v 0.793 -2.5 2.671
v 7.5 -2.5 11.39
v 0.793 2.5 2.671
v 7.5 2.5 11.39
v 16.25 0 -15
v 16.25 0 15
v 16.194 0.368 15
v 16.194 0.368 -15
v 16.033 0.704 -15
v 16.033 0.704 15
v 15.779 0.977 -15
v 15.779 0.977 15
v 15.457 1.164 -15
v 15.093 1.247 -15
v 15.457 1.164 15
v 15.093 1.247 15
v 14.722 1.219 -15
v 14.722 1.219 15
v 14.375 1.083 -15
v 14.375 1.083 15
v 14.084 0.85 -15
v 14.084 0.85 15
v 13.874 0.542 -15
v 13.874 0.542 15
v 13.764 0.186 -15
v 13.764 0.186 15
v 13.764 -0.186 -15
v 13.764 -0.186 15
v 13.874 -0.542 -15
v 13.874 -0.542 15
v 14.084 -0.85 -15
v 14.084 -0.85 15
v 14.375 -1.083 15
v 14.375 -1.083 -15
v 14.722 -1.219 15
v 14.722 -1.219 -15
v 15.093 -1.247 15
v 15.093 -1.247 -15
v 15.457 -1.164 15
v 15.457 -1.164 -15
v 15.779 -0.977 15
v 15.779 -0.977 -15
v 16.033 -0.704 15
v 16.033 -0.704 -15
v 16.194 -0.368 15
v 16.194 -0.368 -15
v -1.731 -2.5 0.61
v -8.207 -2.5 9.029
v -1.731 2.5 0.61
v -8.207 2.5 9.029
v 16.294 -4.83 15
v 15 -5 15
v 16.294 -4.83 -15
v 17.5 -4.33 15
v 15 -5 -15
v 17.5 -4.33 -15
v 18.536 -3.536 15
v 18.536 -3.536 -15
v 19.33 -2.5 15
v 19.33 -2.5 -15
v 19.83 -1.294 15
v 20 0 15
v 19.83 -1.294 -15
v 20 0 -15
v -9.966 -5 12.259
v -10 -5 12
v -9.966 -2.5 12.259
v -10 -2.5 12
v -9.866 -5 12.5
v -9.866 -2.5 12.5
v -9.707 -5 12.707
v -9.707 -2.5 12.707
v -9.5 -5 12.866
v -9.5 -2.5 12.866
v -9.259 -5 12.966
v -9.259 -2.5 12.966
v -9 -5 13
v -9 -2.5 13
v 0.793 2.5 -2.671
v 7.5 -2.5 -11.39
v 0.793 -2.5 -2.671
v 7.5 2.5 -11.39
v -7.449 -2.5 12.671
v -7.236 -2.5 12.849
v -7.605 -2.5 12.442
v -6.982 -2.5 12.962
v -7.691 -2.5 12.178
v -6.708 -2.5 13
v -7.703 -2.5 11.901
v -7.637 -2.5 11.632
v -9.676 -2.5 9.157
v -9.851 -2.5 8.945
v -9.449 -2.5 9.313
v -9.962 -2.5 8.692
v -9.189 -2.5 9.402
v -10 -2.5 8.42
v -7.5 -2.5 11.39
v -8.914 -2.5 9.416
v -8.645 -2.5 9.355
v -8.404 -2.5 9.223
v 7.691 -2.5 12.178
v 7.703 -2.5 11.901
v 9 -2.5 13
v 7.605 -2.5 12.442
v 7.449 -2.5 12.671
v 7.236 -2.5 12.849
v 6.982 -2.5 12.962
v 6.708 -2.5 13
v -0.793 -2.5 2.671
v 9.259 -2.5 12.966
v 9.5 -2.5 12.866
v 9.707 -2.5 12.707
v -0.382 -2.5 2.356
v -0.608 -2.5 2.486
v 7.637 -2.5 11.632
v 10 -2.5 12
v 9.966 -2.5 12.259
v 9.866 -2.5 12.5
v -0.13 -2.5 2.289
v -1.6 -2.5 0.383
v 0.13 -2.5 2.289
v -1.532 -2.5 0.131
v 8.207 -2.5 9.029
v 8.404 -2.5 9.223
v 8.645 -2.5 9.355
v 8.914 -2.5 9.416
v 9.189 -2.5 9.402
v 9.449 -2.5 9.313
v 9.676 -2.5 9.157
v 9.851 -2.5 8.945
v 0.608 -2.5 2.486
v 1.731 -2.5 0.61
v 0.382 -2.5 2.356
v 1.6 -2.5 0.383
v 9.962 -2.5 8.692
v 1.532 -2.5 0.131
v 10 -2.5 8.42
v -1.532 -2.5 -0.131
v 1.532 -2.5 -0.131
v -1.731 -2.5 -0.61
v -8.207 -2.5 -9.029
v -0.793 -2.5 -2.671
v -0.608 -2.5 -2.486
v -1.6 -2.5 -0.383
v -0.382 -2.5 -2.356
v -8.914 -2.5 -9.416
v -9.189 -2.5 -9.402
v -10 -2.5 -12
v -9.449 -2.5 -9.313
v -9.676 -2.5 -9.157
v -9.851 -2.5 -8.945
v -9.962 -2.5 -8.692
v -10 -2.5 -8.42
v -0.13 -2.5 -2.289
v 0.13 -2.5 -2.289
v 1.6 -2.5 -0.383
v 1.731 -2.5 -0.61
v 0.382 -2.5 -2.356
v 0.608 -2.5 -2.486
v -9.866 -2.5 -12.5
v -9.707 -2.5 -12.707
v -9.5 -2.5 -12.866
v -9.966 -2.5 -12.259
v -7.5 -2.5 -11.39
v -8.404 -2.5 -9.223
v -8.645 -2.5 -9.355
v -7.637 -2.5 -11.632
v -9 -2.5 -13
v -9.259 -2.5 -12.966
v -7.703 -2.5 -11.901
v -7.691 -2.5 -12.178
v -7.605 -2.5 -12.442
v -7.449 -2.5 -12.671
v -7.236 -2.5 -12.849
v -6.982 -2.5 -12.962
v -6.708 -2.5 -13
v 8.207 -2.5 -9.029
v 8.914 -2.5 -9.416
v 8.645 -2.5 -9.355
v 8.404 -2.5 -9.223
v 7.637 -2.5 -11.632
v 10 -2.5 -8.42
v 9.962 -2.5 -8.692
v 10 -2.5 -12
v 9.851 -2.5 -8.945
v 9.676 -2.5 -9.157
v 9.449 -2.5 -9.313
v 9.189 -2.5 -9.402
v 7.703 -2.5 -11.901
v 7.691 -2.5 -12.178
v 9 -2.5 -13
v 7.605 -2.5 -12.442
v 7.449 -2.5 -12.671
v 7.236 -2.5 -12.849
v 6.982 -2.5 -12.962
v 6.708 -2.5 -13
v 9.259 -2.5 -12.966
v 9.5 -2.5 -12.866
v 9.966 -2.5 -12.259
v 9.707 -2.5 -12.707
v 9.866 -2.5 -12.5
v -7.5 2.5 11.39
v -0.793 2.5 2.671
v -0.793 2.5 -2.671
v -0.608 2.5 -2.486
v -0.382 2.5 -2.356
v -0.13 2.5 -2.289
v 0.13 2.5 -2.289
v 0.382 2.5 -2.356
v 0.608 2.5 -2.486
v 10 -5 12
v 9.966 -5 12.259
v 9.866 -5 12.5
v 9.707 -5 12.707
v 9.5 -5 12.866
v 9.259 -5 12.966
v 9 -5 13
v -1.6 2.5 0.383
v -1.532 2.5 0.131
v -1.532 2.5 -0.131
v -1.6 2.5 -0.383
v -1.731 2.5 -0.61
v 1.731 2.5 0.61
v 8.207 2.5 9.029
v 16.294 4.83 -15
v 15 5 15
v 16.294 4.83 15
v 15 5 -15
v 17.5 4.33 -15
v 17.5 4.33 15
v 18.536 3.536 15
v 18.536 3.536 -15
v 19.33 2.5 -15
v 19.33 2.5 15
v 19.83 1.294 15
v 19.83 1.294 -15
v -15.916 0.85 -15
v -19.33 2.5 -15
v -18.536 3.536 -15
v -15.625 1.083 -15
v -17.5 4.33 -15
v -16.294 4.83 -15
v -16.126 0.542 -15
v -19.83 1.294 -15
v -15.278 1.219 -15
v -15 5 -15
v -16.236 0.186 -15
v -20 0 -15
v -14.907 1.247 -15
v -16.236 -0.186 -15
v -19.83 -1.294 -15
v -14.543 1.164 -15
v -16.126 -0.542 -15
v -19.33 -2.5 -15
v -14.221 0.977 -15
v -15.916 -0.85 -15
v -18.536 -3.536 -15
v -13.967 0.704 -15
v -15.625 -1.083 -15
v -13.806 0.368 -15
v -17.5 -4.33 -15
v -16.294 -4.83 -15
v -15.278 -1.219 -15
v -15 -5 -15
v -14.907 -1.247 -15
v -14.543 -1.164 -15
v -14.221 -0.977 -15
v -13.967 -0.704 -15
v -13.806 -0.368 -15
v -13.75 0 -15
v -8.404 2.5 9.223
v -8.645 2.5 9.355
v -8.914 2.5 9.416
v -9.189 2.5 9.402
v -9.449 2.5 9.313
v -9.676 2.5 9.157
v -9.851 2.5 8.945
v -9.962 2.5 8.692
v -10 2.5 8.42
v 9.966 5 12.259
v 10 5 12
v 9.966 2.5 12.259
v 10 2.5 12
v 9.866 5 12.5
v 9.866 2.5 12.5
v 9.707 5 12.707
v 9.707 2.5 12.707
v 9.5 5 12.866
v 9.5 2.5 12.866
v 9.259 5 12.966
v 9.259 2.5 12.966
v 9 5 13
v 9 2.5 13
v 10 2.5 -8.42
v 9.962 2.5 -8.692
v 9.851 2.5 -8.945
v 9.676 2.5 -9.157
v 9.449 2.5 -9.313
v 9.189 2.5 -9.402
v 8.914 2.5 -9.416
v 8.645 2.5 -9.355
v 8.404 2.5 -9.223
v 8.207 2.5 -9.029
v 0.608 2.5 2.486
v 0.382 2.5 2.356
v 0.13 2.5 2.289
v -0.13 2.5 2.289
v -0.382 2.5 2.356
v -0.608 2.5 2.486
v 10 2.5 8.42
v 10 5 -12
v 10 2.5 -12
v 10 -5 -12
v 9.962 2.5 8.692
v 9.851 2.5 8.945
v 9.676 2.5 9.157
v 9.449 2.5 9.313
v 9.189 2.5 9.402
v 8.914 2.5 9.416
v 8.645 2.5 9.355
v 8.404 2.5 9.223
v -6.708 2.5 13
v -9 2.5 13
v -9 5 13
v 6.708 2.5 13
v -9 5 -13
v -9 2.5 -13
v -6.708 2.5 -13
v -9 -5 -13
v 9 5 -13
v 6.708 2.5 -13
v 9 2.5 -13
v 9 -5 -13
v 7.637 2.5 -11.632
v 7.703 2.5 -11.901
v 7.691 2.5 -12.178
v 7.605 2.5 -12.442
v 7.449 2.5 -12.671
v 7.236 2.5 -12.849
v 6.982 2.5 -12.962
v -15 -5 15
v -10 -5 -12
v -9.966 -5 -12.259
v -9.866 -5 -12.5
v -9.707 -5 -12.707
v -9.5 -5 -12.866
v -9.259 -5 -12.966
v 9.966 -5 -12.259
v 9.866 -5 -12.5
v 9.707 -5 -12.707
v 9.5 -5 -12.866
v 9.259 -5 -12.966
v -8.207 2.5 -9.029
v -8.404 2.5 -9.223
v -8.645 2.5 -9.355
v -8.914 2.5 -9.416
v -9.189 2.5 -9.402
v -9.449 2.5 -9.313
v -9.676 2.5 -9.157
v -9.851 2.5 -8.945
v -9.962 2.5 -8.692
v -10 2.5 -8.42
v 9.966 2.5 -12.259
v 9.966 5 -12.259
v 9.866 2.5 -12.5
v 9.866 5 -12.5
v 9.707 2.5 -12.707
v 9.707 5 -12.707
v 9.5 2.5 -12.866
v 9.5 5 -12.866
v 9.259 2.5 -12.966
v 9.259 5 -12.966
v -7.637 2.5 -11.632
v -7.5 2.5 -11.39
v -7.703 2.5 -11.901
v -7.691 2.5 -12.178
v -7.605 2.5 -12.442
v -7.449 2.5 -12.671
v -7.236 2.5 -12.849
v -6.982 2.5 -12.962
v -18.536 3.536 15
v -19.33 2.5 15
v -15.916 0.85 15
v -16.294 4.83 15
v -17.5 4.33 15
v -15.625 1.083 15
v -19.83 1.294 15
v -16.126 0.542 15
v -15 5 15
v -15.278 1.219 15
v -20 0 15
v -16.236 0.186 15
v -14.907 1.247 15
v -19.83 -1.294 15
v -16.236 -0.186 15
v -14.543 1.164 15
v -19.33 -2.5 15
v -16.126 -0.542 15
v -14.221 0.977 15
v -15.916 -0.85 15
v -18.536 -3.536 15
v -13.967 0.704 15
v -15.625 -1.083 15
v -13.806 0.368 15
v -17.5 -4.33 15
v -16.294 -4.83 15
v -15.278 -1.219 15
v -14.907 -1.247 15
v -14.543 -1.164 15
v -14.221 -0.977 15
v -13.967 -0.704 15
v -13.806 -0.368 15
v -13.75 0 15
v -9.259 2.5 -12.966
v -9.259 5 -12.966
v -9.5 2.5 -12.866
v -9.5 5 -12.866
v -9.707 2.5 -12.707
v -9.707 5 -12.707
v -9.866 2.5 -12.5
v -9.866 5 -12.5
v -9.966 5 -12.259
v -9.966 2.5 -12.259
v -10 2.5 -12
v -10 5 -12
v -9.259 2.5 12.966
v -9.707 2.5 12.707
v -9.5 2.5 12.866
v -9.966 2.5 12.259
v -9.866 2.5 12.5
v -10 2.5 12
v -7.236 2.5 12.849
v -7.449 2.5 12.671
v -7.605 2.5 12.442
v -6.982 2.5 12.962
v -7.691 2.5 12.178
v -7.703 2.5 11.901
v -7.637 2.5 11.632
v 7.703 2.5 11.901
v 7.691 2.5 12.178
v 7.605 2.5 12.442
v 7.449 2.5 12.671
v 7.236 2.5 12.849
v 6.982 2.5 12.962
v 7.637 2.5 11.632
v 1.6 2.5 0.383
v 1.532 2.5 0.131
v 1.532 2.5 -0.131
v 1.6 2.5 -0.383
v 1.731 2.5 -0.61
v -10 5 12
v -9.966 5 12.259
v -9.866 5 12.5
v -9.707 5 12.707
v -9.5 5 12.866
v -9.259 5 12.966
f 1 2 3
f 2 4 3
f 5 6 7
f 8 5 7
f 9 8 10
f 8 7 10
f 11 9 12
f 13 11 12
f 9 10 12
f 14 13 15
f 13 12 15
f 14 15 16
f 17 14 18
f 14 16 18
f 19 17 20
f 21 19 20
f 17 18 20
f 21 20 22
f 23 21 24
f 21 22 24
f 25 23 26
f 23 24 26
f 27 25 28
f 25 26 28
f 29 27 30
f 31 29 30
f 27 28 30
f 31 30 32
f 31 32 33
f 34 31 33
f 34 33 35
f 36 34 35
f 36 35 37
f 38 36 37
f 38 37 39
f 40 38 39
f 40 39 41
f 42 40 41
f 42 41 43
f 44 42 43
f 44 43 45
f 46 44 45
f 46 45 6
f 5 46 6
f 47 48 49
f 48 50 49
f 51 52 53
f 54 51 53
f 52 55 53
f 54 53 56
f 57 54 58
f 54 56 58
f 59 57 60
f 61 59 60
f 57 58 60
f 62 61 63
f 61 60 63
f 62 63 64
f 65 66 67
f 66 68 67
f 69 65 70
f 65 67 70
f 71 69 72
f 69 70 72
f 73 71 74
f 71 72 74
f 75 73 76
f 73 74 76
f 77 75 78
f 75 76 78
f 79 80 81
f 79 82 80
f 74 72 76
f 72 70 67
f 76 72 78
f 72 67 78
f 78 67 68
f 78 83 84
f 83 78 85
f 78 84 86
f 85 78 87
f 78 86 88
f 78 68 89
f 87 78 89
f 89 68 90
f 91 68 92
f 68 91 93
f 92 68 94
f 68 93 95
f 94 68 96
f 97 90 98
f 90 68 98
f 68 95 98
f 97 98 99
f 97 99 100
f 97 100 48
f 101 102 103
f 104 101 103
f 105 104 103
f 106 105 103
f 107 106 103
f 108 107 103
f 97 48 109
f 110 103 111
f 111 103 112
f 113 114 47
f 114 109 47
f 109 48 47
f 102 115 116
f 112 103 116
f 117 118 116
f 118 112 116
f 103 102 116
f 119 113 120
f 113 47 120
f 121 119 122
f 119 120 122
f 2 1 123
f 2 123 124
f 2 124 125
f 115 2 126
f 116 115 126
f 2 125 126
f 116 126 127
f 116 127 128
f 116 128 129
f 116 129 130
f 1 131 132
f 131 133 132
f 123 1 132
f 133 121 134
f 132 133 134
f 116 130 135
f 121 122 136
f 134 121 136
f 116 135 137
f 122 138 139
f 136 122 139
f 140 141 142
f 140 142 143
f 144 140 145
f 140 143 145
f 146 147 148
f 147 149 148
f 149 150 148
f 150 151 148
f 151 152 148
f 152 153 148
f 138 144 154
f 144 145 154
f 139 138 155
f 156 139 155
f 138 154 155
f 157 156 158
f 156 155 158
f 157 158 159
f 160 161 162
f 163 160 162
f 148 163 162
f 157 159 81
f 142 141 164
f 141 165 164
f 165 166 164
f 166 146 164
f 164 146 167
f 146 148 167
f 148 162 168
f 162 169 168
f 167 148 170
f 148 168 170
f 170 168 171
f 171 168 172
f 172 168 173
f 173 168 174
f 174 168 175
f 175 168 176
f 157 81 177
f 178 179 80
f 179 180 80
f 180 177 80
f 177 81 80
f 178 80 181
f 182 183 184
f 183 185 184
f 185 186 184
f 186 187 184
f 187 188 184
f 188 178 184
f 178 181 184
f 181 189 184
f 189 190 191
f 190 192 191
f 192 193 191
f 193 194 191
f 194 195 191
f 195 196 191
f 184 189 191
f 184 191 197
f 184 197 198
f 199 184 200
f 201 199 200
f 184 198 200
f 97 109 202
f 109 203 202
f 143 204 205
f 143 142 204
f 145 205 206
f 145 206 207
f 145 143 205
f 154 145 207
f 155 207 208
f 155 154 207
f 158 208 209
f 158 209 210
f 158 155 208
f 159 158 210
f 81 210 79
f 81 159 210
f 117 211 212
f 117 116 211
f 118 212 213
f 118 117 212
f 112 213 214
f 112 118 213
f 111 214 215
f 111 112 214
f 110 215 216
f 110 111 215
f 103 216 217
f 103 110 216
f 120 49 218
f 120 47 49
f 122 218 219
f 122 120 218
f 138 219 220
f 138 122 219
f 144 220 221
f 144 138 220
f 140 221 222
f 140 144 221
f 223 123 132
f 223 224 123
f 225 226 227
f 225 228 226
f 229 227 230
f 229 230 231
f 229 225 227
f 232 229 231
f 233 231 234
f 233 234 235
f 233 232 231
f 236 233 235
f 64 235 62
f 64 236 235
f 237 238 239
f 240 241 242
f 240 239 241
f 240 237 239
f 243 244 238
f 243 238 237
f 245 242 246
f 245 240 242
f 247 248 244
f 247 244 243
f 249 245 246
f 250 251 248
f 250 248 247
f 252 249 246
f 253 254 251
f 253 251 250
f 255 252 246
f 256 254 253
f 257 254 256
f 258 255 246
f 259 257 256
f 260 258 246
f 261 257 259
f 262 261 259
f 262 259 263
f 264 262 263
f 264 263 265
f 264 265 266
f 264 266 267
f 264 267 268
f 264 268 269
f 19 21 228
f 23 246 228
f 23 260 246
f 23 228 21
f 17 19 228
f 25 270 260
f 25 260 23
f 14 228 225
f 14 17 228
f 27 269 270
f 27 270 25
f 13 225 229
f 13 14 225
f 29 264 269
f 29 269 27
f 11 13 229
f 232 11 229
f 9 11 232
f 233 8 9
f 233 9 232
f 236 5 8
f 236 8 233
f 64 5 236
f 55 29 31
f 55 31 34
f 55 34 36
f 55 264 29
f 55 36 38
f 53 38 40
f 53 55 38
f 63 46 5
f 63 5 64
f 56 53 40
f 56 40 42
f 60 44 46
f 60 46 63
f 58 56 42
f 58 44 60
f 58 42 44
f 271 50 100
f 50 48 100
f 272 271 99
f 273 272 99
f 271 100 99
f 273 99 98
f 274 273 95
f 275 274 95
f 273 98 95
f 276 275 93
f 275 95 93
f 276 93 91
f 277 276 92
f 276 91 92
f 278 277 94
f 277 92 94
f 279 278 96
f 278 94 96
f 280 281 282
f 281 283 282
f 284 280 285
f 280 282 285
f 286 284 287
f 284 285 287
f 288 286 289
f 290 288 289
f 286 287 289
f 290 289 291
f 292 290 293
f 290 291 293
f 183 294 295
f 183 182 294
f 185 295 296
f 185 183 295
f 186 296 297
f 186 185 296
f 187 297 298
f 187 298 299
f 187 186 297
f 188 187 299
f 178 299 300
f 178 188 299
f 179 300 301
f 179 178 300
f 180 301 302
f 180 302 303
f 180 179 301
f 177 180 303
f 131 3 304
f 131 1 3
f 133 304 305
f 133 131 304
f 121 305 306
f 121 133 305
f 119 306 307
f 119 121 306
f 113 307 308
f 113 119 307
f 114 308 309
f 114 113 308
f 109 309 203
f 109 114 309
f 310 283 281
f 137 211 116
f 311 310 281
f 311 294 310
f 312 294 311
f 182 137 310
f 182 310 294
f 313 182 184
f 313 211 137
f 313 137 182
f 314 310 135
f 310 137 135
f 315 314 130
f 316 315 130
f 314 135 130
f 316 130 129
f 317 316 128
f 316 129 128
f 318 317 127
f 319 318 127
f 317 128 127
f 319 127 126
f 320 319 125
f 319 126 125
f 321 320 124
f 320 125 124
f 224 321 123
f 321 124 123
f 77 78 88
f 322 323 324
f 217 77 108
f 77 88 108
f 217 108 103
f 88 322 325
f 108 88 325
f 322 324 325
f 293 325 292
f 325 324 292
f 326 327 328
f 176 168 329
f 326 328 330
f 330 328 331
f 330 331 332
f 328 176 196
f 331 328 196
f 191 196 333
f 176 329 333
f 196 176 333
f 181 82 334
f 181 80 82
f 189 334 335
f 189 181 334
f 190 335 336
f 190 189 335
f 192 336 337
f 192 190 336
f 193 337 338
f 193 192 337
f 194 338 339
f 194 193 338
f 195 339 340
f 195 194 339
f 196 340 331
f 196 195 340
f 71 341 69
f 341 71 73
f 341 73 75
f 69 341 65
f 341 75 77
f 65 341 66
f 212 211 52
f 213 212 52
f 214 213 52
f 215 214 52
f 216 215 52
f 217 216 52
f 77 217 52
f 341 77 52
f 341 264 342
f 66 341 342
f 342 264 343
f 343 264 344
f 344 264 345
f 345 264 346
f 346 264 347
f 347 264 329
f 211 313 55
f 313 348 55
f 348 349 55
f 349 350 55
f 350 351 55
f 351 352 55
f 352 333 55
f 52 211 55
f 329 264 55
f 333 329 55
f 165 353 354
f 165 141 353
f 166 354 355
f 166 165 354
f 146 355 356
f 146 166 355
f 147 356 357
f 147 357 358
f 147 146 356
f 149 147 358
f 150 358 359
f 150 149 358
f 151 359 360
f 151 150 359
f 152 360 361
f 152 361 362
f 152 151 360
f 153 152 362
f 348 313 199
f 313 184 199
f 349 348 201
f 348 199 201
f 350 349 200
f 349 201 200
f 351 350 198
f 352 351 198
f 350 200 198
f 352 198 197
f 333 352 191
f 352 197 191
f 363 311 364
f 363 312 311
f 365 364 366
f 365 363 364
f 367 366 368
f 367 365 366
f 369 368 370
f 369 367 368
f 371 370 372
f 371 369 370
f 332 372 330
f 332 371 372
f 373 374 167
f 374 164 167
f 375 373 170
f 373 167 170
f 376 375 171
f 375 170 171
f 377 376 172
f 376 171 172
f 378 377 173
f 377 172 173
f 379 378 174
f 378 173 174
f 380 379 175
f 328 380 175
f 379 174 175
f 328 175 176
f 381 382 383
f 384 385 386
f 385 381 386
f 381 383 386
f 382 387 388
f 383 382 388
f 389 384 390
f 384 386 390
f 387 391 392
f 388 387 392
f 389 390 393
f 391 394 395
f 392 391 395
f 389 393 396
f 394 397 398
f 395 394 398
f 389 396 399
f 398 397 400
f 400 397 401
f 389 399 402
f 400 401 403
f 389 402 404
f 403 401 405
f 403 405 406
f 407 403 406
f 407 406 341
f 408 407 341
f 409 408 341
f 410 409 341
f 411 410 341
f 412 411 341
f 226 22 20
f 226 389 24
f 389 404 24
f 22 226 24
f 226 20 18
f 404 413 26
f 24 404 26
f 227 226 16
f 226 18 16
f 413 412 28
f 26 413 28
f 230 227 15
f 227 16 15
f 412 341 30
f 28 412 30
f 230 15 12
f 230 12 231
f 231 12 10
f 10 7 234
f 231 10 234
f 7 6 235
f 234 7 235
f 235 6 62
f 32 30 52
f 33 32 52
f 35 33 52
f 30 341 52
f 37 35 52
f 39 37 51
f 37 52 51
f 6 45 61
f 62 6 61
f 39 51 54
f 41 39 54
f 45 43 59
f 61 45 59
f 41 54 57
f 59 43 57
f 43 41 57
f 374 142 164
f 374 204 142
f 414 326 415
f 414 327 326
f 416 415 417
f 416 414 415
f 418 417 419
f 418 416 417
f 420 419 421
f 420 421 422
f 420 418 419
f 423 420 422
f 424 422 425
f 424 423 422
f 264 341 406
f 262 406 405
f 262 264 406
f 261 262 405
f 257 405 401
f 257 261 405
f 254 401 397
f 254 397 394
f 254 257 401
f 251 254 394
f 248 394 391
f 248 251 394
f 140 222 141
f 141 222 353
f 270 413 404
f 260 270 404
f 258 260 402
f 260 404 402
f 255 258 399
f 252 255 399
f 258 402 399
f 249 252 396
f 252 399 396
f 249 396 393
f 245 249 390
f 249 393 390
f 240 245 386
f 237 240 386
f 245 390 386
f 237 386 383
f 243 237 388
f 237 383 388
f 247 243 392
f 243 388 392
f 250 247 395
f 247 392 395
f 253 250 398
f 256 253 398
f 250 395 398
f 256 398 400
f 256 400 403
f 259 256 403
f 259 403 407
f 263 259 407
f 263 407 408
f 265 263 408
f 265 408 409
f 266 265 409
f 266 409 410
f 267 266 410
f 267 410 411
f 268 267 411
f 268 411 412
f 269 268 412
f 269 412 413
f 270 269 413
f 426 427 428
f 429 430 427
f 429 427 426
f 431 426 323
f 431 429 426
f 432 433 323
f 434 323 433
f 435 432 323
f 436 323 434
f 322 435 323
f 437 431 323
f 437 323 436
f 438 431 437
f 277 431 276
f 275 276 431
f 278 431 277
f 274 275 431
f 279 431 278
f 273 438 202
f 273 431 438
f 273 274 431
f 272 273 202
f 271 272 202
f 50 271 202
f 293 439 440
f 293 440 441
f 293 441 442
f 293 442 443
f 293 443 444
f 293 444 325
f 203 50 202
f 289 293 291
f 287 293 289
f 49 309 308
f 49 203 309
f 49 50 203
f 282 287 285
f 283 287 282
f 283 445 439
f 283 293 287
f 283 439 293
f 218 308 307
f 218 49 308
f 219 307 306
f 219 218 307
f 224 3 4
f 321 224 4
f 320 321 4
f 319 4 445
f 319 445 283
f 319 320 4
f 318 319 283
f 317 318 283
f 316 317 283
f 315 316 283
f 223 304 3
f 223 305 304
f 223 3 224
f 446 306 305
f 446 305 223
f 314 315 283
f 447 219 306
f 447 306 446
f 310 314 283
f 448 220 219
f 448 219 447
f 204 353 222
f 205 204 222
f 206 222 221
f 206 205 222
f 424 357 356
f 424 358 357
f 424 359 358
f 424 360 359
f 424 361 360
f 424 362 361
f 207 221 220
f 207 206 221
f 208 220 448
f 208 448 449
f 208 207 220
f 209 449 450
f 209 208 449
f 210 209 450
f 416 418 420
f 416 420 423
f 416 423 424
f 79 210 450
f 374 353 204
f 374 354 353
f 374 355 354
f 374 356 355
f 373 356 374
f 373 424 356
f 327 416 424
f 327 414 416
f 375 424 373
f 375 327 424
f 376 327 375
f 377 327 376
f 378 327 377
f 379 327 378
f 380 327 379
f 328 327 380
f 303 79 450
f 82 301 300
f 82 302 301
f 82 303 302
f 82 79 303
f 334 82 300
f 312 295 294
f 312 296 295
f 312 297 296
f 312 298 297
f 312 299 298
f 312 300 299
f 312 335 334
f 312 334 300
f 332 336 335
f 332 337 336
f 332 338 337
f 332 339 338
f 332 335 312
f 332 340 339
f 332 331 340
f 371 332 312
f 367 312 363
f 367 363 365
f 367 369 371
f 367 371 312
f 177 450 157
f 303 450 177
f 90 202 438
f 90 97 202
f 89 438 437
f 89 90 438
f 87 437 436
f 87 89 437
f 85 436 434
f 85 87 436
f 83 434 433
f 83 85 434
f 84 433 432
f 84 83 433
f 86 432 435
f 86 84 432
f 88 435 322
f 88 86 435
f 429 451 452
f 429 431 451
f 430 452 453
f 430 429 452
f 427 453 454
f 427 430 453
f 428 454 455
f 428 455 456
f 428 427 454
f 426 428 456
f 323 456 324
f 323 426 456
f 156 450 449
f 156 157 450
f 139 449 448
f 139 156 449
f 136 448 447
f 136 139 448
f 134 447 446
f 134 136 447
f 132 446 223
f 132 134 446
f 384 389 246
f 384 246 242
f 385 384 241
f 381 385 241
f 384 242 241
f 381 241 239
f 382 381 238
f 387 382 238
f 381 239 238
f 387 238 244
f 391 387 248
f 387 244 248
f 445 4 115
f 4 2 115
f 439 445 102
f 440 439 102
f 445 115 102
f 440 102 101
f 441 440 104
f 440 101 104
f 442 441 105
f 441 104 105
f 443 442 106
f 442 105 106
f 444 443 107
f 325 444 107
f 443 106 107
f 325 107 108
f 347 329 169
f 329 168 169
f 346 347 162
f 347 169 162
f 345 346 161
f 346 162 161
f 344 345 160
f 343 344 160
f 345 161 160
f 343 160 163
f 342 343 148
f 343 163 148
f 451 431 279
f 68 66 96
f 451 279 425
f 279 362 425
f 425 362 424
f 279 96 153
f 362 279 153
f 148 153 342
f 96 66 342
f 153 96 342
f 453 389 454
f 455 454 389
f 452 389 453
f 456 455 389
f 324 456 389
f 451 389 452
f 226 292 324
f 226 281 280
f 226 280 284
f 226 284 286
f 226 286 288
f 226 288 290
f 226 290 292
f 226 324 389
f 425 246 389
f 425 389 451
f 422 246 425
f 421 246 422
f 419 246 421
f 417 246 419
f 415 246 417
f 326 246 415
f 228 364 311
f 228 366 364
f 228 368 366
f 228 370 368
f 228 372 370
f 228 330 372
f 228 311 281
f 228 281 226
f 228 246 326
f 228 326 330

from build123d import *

# Parameters (mm, degrees)
EXTRUDE_425_DEPTH      = 5
EXTRUDE_425_DEPTH_BACK = 5
SKETCH_1_W             = 40
SKETCH_1_H             = 30
SKETCH_5_R             = 1.25
CUT_EXTRUDE_679_DEPTH  = 37.400549446
CUT_EXTRUDE_1219_DEPTH = 27.925824036
SKETCH_7_W             = 20
SKETCH_7_H             = 26
CUT_EXTRUDE_1457_DEPTH = 2.5
FILLET_1_R             = 1
FILLET_2_R             = 1
FILLET_3_R             = 5


with BuildPart() as part:
    # Эскиз1 → Extrude 425 (new, two sides: drawn at the far end of the back side and taken through both)
    with BuildSketch(Plane(origin=(0, 0, 0), x_dir=(1, 0, 0), z_dir=(0, 1, 0)).offset(-EXTRUDE_425_DEPTH_BACK)):
        Rectangle(SKETCH_1_W, SKETCH_1_H)
    extrude(amount=EXTRUDE_425_DEPTH + EXTRUDE_425_DEPTH_BACK)

    # Эскиз5 → Cut-Extrude 679 (cut, through all)
    with BuildSketch(Plane.XY.offset(15)):
        with Locations((-15, 0)):
            Circle(SKETCH_5_R)
        with Locations((15, 0)):
            Circle(SKETCH_5_R)
    extrude(amount=-CUT_EXTRUDE_679_DEPTH, mode=Mode.SUBTRACT)

    # Эскиз6 → Cut-Extrude 1219 (cut, through all)
    with BuildSketch(Plane(origin=(0, 5, 0), x_dir=(1, 0, 0), z_dir=(0, 1, 0))):
        Polygon((-8.738367733, 13), (8.738367733, 13), (0, 1.640121947), align=None)
        Polygon((10, 11.359878053), (10, -11.359878053), (1.261632267, 0), align=None)
        Polygon((-8.738367733, -13), (8.738367733, -13), (0, -1.640121947), align=None)
        Polygon((-10, 11.359878053), (-10, -11.359878053), (-1.261632267, 0), align=None)
    extrude(amount=-CUT_EXTRUDE_1219_DEPTH, mode=Mode.SUBTRACT)

    # Эскиз7 → Cut-Extrude 1457 (cut)
    with BuildSketch(Plane(origin=(0, 5, 0), x_dir=(1, 0, 0), z_dir=(0, 1, 0))):
        Rectangle(SKETCH_7_W, SKETCH_7_H)
    cut_extrude_1457 = extrude(amount=-CUT_EXTRUDE_1457_DEPTH, mode=Mode.SUBTRACT)

    # Зеркальное отражение1: Cut-Extrude 1457 across plane
    add(cut_extrude_1457.mirror(Plane.ZX), mode=Mode.SUBTRACT)

    # Скругление1
    fillet_1_edges = [part.edges().sort_by_distance(p)[0] for p in [
        (8.738367733, 0, 13),
        (-8.738367733, 0, 13),
        (-10, 0, 11.359878053),
        (-10, 0, -11.359878053),
        (-8.738367733, 0, -13),
        (8.738367733, 0, -13),
        (10, 0, -11.359878053),
        (10, 0, 11.359878053),
        (-10, -3.75, -13),
        (-10, -3.75, 13),
        (10, -3.75, 13),
        (10, -3.75, -13),
        (10, 3.75, -13),
        (-10, 3.75, -13),
        (-10, 3.75, 13),
        (10, 3.75, 13),
    ]]
    fillet(fillet_1_edges, radius=FILLET_1_R)

    # Скругление2
    fillet_2_edges = [part.edges().sort_by_distance(p)[0] for p in [
        (0, 0, 1.640121947),
        (-1.261632267, 0, 0),
        (0, 0, -1.640121947),
        (1.261632267, 0, 0),
    ]]
    fillet(fillet_2_edges, radius=FILLET_2_R)

    # Скругление3
    fillet_3_edges = [part.edges().sort_by_distance(p)[0] for p in [
        (-20, -5, 0),
        (-20, 5, 0),
        (20, -5, 0),
        (20, 5, 0),
    ]]
    fillet(fillet_3_edges, radius=FILLET_3_R - 0.0001)  # a hair under: the kernel refuses the full size


solid = part.part
